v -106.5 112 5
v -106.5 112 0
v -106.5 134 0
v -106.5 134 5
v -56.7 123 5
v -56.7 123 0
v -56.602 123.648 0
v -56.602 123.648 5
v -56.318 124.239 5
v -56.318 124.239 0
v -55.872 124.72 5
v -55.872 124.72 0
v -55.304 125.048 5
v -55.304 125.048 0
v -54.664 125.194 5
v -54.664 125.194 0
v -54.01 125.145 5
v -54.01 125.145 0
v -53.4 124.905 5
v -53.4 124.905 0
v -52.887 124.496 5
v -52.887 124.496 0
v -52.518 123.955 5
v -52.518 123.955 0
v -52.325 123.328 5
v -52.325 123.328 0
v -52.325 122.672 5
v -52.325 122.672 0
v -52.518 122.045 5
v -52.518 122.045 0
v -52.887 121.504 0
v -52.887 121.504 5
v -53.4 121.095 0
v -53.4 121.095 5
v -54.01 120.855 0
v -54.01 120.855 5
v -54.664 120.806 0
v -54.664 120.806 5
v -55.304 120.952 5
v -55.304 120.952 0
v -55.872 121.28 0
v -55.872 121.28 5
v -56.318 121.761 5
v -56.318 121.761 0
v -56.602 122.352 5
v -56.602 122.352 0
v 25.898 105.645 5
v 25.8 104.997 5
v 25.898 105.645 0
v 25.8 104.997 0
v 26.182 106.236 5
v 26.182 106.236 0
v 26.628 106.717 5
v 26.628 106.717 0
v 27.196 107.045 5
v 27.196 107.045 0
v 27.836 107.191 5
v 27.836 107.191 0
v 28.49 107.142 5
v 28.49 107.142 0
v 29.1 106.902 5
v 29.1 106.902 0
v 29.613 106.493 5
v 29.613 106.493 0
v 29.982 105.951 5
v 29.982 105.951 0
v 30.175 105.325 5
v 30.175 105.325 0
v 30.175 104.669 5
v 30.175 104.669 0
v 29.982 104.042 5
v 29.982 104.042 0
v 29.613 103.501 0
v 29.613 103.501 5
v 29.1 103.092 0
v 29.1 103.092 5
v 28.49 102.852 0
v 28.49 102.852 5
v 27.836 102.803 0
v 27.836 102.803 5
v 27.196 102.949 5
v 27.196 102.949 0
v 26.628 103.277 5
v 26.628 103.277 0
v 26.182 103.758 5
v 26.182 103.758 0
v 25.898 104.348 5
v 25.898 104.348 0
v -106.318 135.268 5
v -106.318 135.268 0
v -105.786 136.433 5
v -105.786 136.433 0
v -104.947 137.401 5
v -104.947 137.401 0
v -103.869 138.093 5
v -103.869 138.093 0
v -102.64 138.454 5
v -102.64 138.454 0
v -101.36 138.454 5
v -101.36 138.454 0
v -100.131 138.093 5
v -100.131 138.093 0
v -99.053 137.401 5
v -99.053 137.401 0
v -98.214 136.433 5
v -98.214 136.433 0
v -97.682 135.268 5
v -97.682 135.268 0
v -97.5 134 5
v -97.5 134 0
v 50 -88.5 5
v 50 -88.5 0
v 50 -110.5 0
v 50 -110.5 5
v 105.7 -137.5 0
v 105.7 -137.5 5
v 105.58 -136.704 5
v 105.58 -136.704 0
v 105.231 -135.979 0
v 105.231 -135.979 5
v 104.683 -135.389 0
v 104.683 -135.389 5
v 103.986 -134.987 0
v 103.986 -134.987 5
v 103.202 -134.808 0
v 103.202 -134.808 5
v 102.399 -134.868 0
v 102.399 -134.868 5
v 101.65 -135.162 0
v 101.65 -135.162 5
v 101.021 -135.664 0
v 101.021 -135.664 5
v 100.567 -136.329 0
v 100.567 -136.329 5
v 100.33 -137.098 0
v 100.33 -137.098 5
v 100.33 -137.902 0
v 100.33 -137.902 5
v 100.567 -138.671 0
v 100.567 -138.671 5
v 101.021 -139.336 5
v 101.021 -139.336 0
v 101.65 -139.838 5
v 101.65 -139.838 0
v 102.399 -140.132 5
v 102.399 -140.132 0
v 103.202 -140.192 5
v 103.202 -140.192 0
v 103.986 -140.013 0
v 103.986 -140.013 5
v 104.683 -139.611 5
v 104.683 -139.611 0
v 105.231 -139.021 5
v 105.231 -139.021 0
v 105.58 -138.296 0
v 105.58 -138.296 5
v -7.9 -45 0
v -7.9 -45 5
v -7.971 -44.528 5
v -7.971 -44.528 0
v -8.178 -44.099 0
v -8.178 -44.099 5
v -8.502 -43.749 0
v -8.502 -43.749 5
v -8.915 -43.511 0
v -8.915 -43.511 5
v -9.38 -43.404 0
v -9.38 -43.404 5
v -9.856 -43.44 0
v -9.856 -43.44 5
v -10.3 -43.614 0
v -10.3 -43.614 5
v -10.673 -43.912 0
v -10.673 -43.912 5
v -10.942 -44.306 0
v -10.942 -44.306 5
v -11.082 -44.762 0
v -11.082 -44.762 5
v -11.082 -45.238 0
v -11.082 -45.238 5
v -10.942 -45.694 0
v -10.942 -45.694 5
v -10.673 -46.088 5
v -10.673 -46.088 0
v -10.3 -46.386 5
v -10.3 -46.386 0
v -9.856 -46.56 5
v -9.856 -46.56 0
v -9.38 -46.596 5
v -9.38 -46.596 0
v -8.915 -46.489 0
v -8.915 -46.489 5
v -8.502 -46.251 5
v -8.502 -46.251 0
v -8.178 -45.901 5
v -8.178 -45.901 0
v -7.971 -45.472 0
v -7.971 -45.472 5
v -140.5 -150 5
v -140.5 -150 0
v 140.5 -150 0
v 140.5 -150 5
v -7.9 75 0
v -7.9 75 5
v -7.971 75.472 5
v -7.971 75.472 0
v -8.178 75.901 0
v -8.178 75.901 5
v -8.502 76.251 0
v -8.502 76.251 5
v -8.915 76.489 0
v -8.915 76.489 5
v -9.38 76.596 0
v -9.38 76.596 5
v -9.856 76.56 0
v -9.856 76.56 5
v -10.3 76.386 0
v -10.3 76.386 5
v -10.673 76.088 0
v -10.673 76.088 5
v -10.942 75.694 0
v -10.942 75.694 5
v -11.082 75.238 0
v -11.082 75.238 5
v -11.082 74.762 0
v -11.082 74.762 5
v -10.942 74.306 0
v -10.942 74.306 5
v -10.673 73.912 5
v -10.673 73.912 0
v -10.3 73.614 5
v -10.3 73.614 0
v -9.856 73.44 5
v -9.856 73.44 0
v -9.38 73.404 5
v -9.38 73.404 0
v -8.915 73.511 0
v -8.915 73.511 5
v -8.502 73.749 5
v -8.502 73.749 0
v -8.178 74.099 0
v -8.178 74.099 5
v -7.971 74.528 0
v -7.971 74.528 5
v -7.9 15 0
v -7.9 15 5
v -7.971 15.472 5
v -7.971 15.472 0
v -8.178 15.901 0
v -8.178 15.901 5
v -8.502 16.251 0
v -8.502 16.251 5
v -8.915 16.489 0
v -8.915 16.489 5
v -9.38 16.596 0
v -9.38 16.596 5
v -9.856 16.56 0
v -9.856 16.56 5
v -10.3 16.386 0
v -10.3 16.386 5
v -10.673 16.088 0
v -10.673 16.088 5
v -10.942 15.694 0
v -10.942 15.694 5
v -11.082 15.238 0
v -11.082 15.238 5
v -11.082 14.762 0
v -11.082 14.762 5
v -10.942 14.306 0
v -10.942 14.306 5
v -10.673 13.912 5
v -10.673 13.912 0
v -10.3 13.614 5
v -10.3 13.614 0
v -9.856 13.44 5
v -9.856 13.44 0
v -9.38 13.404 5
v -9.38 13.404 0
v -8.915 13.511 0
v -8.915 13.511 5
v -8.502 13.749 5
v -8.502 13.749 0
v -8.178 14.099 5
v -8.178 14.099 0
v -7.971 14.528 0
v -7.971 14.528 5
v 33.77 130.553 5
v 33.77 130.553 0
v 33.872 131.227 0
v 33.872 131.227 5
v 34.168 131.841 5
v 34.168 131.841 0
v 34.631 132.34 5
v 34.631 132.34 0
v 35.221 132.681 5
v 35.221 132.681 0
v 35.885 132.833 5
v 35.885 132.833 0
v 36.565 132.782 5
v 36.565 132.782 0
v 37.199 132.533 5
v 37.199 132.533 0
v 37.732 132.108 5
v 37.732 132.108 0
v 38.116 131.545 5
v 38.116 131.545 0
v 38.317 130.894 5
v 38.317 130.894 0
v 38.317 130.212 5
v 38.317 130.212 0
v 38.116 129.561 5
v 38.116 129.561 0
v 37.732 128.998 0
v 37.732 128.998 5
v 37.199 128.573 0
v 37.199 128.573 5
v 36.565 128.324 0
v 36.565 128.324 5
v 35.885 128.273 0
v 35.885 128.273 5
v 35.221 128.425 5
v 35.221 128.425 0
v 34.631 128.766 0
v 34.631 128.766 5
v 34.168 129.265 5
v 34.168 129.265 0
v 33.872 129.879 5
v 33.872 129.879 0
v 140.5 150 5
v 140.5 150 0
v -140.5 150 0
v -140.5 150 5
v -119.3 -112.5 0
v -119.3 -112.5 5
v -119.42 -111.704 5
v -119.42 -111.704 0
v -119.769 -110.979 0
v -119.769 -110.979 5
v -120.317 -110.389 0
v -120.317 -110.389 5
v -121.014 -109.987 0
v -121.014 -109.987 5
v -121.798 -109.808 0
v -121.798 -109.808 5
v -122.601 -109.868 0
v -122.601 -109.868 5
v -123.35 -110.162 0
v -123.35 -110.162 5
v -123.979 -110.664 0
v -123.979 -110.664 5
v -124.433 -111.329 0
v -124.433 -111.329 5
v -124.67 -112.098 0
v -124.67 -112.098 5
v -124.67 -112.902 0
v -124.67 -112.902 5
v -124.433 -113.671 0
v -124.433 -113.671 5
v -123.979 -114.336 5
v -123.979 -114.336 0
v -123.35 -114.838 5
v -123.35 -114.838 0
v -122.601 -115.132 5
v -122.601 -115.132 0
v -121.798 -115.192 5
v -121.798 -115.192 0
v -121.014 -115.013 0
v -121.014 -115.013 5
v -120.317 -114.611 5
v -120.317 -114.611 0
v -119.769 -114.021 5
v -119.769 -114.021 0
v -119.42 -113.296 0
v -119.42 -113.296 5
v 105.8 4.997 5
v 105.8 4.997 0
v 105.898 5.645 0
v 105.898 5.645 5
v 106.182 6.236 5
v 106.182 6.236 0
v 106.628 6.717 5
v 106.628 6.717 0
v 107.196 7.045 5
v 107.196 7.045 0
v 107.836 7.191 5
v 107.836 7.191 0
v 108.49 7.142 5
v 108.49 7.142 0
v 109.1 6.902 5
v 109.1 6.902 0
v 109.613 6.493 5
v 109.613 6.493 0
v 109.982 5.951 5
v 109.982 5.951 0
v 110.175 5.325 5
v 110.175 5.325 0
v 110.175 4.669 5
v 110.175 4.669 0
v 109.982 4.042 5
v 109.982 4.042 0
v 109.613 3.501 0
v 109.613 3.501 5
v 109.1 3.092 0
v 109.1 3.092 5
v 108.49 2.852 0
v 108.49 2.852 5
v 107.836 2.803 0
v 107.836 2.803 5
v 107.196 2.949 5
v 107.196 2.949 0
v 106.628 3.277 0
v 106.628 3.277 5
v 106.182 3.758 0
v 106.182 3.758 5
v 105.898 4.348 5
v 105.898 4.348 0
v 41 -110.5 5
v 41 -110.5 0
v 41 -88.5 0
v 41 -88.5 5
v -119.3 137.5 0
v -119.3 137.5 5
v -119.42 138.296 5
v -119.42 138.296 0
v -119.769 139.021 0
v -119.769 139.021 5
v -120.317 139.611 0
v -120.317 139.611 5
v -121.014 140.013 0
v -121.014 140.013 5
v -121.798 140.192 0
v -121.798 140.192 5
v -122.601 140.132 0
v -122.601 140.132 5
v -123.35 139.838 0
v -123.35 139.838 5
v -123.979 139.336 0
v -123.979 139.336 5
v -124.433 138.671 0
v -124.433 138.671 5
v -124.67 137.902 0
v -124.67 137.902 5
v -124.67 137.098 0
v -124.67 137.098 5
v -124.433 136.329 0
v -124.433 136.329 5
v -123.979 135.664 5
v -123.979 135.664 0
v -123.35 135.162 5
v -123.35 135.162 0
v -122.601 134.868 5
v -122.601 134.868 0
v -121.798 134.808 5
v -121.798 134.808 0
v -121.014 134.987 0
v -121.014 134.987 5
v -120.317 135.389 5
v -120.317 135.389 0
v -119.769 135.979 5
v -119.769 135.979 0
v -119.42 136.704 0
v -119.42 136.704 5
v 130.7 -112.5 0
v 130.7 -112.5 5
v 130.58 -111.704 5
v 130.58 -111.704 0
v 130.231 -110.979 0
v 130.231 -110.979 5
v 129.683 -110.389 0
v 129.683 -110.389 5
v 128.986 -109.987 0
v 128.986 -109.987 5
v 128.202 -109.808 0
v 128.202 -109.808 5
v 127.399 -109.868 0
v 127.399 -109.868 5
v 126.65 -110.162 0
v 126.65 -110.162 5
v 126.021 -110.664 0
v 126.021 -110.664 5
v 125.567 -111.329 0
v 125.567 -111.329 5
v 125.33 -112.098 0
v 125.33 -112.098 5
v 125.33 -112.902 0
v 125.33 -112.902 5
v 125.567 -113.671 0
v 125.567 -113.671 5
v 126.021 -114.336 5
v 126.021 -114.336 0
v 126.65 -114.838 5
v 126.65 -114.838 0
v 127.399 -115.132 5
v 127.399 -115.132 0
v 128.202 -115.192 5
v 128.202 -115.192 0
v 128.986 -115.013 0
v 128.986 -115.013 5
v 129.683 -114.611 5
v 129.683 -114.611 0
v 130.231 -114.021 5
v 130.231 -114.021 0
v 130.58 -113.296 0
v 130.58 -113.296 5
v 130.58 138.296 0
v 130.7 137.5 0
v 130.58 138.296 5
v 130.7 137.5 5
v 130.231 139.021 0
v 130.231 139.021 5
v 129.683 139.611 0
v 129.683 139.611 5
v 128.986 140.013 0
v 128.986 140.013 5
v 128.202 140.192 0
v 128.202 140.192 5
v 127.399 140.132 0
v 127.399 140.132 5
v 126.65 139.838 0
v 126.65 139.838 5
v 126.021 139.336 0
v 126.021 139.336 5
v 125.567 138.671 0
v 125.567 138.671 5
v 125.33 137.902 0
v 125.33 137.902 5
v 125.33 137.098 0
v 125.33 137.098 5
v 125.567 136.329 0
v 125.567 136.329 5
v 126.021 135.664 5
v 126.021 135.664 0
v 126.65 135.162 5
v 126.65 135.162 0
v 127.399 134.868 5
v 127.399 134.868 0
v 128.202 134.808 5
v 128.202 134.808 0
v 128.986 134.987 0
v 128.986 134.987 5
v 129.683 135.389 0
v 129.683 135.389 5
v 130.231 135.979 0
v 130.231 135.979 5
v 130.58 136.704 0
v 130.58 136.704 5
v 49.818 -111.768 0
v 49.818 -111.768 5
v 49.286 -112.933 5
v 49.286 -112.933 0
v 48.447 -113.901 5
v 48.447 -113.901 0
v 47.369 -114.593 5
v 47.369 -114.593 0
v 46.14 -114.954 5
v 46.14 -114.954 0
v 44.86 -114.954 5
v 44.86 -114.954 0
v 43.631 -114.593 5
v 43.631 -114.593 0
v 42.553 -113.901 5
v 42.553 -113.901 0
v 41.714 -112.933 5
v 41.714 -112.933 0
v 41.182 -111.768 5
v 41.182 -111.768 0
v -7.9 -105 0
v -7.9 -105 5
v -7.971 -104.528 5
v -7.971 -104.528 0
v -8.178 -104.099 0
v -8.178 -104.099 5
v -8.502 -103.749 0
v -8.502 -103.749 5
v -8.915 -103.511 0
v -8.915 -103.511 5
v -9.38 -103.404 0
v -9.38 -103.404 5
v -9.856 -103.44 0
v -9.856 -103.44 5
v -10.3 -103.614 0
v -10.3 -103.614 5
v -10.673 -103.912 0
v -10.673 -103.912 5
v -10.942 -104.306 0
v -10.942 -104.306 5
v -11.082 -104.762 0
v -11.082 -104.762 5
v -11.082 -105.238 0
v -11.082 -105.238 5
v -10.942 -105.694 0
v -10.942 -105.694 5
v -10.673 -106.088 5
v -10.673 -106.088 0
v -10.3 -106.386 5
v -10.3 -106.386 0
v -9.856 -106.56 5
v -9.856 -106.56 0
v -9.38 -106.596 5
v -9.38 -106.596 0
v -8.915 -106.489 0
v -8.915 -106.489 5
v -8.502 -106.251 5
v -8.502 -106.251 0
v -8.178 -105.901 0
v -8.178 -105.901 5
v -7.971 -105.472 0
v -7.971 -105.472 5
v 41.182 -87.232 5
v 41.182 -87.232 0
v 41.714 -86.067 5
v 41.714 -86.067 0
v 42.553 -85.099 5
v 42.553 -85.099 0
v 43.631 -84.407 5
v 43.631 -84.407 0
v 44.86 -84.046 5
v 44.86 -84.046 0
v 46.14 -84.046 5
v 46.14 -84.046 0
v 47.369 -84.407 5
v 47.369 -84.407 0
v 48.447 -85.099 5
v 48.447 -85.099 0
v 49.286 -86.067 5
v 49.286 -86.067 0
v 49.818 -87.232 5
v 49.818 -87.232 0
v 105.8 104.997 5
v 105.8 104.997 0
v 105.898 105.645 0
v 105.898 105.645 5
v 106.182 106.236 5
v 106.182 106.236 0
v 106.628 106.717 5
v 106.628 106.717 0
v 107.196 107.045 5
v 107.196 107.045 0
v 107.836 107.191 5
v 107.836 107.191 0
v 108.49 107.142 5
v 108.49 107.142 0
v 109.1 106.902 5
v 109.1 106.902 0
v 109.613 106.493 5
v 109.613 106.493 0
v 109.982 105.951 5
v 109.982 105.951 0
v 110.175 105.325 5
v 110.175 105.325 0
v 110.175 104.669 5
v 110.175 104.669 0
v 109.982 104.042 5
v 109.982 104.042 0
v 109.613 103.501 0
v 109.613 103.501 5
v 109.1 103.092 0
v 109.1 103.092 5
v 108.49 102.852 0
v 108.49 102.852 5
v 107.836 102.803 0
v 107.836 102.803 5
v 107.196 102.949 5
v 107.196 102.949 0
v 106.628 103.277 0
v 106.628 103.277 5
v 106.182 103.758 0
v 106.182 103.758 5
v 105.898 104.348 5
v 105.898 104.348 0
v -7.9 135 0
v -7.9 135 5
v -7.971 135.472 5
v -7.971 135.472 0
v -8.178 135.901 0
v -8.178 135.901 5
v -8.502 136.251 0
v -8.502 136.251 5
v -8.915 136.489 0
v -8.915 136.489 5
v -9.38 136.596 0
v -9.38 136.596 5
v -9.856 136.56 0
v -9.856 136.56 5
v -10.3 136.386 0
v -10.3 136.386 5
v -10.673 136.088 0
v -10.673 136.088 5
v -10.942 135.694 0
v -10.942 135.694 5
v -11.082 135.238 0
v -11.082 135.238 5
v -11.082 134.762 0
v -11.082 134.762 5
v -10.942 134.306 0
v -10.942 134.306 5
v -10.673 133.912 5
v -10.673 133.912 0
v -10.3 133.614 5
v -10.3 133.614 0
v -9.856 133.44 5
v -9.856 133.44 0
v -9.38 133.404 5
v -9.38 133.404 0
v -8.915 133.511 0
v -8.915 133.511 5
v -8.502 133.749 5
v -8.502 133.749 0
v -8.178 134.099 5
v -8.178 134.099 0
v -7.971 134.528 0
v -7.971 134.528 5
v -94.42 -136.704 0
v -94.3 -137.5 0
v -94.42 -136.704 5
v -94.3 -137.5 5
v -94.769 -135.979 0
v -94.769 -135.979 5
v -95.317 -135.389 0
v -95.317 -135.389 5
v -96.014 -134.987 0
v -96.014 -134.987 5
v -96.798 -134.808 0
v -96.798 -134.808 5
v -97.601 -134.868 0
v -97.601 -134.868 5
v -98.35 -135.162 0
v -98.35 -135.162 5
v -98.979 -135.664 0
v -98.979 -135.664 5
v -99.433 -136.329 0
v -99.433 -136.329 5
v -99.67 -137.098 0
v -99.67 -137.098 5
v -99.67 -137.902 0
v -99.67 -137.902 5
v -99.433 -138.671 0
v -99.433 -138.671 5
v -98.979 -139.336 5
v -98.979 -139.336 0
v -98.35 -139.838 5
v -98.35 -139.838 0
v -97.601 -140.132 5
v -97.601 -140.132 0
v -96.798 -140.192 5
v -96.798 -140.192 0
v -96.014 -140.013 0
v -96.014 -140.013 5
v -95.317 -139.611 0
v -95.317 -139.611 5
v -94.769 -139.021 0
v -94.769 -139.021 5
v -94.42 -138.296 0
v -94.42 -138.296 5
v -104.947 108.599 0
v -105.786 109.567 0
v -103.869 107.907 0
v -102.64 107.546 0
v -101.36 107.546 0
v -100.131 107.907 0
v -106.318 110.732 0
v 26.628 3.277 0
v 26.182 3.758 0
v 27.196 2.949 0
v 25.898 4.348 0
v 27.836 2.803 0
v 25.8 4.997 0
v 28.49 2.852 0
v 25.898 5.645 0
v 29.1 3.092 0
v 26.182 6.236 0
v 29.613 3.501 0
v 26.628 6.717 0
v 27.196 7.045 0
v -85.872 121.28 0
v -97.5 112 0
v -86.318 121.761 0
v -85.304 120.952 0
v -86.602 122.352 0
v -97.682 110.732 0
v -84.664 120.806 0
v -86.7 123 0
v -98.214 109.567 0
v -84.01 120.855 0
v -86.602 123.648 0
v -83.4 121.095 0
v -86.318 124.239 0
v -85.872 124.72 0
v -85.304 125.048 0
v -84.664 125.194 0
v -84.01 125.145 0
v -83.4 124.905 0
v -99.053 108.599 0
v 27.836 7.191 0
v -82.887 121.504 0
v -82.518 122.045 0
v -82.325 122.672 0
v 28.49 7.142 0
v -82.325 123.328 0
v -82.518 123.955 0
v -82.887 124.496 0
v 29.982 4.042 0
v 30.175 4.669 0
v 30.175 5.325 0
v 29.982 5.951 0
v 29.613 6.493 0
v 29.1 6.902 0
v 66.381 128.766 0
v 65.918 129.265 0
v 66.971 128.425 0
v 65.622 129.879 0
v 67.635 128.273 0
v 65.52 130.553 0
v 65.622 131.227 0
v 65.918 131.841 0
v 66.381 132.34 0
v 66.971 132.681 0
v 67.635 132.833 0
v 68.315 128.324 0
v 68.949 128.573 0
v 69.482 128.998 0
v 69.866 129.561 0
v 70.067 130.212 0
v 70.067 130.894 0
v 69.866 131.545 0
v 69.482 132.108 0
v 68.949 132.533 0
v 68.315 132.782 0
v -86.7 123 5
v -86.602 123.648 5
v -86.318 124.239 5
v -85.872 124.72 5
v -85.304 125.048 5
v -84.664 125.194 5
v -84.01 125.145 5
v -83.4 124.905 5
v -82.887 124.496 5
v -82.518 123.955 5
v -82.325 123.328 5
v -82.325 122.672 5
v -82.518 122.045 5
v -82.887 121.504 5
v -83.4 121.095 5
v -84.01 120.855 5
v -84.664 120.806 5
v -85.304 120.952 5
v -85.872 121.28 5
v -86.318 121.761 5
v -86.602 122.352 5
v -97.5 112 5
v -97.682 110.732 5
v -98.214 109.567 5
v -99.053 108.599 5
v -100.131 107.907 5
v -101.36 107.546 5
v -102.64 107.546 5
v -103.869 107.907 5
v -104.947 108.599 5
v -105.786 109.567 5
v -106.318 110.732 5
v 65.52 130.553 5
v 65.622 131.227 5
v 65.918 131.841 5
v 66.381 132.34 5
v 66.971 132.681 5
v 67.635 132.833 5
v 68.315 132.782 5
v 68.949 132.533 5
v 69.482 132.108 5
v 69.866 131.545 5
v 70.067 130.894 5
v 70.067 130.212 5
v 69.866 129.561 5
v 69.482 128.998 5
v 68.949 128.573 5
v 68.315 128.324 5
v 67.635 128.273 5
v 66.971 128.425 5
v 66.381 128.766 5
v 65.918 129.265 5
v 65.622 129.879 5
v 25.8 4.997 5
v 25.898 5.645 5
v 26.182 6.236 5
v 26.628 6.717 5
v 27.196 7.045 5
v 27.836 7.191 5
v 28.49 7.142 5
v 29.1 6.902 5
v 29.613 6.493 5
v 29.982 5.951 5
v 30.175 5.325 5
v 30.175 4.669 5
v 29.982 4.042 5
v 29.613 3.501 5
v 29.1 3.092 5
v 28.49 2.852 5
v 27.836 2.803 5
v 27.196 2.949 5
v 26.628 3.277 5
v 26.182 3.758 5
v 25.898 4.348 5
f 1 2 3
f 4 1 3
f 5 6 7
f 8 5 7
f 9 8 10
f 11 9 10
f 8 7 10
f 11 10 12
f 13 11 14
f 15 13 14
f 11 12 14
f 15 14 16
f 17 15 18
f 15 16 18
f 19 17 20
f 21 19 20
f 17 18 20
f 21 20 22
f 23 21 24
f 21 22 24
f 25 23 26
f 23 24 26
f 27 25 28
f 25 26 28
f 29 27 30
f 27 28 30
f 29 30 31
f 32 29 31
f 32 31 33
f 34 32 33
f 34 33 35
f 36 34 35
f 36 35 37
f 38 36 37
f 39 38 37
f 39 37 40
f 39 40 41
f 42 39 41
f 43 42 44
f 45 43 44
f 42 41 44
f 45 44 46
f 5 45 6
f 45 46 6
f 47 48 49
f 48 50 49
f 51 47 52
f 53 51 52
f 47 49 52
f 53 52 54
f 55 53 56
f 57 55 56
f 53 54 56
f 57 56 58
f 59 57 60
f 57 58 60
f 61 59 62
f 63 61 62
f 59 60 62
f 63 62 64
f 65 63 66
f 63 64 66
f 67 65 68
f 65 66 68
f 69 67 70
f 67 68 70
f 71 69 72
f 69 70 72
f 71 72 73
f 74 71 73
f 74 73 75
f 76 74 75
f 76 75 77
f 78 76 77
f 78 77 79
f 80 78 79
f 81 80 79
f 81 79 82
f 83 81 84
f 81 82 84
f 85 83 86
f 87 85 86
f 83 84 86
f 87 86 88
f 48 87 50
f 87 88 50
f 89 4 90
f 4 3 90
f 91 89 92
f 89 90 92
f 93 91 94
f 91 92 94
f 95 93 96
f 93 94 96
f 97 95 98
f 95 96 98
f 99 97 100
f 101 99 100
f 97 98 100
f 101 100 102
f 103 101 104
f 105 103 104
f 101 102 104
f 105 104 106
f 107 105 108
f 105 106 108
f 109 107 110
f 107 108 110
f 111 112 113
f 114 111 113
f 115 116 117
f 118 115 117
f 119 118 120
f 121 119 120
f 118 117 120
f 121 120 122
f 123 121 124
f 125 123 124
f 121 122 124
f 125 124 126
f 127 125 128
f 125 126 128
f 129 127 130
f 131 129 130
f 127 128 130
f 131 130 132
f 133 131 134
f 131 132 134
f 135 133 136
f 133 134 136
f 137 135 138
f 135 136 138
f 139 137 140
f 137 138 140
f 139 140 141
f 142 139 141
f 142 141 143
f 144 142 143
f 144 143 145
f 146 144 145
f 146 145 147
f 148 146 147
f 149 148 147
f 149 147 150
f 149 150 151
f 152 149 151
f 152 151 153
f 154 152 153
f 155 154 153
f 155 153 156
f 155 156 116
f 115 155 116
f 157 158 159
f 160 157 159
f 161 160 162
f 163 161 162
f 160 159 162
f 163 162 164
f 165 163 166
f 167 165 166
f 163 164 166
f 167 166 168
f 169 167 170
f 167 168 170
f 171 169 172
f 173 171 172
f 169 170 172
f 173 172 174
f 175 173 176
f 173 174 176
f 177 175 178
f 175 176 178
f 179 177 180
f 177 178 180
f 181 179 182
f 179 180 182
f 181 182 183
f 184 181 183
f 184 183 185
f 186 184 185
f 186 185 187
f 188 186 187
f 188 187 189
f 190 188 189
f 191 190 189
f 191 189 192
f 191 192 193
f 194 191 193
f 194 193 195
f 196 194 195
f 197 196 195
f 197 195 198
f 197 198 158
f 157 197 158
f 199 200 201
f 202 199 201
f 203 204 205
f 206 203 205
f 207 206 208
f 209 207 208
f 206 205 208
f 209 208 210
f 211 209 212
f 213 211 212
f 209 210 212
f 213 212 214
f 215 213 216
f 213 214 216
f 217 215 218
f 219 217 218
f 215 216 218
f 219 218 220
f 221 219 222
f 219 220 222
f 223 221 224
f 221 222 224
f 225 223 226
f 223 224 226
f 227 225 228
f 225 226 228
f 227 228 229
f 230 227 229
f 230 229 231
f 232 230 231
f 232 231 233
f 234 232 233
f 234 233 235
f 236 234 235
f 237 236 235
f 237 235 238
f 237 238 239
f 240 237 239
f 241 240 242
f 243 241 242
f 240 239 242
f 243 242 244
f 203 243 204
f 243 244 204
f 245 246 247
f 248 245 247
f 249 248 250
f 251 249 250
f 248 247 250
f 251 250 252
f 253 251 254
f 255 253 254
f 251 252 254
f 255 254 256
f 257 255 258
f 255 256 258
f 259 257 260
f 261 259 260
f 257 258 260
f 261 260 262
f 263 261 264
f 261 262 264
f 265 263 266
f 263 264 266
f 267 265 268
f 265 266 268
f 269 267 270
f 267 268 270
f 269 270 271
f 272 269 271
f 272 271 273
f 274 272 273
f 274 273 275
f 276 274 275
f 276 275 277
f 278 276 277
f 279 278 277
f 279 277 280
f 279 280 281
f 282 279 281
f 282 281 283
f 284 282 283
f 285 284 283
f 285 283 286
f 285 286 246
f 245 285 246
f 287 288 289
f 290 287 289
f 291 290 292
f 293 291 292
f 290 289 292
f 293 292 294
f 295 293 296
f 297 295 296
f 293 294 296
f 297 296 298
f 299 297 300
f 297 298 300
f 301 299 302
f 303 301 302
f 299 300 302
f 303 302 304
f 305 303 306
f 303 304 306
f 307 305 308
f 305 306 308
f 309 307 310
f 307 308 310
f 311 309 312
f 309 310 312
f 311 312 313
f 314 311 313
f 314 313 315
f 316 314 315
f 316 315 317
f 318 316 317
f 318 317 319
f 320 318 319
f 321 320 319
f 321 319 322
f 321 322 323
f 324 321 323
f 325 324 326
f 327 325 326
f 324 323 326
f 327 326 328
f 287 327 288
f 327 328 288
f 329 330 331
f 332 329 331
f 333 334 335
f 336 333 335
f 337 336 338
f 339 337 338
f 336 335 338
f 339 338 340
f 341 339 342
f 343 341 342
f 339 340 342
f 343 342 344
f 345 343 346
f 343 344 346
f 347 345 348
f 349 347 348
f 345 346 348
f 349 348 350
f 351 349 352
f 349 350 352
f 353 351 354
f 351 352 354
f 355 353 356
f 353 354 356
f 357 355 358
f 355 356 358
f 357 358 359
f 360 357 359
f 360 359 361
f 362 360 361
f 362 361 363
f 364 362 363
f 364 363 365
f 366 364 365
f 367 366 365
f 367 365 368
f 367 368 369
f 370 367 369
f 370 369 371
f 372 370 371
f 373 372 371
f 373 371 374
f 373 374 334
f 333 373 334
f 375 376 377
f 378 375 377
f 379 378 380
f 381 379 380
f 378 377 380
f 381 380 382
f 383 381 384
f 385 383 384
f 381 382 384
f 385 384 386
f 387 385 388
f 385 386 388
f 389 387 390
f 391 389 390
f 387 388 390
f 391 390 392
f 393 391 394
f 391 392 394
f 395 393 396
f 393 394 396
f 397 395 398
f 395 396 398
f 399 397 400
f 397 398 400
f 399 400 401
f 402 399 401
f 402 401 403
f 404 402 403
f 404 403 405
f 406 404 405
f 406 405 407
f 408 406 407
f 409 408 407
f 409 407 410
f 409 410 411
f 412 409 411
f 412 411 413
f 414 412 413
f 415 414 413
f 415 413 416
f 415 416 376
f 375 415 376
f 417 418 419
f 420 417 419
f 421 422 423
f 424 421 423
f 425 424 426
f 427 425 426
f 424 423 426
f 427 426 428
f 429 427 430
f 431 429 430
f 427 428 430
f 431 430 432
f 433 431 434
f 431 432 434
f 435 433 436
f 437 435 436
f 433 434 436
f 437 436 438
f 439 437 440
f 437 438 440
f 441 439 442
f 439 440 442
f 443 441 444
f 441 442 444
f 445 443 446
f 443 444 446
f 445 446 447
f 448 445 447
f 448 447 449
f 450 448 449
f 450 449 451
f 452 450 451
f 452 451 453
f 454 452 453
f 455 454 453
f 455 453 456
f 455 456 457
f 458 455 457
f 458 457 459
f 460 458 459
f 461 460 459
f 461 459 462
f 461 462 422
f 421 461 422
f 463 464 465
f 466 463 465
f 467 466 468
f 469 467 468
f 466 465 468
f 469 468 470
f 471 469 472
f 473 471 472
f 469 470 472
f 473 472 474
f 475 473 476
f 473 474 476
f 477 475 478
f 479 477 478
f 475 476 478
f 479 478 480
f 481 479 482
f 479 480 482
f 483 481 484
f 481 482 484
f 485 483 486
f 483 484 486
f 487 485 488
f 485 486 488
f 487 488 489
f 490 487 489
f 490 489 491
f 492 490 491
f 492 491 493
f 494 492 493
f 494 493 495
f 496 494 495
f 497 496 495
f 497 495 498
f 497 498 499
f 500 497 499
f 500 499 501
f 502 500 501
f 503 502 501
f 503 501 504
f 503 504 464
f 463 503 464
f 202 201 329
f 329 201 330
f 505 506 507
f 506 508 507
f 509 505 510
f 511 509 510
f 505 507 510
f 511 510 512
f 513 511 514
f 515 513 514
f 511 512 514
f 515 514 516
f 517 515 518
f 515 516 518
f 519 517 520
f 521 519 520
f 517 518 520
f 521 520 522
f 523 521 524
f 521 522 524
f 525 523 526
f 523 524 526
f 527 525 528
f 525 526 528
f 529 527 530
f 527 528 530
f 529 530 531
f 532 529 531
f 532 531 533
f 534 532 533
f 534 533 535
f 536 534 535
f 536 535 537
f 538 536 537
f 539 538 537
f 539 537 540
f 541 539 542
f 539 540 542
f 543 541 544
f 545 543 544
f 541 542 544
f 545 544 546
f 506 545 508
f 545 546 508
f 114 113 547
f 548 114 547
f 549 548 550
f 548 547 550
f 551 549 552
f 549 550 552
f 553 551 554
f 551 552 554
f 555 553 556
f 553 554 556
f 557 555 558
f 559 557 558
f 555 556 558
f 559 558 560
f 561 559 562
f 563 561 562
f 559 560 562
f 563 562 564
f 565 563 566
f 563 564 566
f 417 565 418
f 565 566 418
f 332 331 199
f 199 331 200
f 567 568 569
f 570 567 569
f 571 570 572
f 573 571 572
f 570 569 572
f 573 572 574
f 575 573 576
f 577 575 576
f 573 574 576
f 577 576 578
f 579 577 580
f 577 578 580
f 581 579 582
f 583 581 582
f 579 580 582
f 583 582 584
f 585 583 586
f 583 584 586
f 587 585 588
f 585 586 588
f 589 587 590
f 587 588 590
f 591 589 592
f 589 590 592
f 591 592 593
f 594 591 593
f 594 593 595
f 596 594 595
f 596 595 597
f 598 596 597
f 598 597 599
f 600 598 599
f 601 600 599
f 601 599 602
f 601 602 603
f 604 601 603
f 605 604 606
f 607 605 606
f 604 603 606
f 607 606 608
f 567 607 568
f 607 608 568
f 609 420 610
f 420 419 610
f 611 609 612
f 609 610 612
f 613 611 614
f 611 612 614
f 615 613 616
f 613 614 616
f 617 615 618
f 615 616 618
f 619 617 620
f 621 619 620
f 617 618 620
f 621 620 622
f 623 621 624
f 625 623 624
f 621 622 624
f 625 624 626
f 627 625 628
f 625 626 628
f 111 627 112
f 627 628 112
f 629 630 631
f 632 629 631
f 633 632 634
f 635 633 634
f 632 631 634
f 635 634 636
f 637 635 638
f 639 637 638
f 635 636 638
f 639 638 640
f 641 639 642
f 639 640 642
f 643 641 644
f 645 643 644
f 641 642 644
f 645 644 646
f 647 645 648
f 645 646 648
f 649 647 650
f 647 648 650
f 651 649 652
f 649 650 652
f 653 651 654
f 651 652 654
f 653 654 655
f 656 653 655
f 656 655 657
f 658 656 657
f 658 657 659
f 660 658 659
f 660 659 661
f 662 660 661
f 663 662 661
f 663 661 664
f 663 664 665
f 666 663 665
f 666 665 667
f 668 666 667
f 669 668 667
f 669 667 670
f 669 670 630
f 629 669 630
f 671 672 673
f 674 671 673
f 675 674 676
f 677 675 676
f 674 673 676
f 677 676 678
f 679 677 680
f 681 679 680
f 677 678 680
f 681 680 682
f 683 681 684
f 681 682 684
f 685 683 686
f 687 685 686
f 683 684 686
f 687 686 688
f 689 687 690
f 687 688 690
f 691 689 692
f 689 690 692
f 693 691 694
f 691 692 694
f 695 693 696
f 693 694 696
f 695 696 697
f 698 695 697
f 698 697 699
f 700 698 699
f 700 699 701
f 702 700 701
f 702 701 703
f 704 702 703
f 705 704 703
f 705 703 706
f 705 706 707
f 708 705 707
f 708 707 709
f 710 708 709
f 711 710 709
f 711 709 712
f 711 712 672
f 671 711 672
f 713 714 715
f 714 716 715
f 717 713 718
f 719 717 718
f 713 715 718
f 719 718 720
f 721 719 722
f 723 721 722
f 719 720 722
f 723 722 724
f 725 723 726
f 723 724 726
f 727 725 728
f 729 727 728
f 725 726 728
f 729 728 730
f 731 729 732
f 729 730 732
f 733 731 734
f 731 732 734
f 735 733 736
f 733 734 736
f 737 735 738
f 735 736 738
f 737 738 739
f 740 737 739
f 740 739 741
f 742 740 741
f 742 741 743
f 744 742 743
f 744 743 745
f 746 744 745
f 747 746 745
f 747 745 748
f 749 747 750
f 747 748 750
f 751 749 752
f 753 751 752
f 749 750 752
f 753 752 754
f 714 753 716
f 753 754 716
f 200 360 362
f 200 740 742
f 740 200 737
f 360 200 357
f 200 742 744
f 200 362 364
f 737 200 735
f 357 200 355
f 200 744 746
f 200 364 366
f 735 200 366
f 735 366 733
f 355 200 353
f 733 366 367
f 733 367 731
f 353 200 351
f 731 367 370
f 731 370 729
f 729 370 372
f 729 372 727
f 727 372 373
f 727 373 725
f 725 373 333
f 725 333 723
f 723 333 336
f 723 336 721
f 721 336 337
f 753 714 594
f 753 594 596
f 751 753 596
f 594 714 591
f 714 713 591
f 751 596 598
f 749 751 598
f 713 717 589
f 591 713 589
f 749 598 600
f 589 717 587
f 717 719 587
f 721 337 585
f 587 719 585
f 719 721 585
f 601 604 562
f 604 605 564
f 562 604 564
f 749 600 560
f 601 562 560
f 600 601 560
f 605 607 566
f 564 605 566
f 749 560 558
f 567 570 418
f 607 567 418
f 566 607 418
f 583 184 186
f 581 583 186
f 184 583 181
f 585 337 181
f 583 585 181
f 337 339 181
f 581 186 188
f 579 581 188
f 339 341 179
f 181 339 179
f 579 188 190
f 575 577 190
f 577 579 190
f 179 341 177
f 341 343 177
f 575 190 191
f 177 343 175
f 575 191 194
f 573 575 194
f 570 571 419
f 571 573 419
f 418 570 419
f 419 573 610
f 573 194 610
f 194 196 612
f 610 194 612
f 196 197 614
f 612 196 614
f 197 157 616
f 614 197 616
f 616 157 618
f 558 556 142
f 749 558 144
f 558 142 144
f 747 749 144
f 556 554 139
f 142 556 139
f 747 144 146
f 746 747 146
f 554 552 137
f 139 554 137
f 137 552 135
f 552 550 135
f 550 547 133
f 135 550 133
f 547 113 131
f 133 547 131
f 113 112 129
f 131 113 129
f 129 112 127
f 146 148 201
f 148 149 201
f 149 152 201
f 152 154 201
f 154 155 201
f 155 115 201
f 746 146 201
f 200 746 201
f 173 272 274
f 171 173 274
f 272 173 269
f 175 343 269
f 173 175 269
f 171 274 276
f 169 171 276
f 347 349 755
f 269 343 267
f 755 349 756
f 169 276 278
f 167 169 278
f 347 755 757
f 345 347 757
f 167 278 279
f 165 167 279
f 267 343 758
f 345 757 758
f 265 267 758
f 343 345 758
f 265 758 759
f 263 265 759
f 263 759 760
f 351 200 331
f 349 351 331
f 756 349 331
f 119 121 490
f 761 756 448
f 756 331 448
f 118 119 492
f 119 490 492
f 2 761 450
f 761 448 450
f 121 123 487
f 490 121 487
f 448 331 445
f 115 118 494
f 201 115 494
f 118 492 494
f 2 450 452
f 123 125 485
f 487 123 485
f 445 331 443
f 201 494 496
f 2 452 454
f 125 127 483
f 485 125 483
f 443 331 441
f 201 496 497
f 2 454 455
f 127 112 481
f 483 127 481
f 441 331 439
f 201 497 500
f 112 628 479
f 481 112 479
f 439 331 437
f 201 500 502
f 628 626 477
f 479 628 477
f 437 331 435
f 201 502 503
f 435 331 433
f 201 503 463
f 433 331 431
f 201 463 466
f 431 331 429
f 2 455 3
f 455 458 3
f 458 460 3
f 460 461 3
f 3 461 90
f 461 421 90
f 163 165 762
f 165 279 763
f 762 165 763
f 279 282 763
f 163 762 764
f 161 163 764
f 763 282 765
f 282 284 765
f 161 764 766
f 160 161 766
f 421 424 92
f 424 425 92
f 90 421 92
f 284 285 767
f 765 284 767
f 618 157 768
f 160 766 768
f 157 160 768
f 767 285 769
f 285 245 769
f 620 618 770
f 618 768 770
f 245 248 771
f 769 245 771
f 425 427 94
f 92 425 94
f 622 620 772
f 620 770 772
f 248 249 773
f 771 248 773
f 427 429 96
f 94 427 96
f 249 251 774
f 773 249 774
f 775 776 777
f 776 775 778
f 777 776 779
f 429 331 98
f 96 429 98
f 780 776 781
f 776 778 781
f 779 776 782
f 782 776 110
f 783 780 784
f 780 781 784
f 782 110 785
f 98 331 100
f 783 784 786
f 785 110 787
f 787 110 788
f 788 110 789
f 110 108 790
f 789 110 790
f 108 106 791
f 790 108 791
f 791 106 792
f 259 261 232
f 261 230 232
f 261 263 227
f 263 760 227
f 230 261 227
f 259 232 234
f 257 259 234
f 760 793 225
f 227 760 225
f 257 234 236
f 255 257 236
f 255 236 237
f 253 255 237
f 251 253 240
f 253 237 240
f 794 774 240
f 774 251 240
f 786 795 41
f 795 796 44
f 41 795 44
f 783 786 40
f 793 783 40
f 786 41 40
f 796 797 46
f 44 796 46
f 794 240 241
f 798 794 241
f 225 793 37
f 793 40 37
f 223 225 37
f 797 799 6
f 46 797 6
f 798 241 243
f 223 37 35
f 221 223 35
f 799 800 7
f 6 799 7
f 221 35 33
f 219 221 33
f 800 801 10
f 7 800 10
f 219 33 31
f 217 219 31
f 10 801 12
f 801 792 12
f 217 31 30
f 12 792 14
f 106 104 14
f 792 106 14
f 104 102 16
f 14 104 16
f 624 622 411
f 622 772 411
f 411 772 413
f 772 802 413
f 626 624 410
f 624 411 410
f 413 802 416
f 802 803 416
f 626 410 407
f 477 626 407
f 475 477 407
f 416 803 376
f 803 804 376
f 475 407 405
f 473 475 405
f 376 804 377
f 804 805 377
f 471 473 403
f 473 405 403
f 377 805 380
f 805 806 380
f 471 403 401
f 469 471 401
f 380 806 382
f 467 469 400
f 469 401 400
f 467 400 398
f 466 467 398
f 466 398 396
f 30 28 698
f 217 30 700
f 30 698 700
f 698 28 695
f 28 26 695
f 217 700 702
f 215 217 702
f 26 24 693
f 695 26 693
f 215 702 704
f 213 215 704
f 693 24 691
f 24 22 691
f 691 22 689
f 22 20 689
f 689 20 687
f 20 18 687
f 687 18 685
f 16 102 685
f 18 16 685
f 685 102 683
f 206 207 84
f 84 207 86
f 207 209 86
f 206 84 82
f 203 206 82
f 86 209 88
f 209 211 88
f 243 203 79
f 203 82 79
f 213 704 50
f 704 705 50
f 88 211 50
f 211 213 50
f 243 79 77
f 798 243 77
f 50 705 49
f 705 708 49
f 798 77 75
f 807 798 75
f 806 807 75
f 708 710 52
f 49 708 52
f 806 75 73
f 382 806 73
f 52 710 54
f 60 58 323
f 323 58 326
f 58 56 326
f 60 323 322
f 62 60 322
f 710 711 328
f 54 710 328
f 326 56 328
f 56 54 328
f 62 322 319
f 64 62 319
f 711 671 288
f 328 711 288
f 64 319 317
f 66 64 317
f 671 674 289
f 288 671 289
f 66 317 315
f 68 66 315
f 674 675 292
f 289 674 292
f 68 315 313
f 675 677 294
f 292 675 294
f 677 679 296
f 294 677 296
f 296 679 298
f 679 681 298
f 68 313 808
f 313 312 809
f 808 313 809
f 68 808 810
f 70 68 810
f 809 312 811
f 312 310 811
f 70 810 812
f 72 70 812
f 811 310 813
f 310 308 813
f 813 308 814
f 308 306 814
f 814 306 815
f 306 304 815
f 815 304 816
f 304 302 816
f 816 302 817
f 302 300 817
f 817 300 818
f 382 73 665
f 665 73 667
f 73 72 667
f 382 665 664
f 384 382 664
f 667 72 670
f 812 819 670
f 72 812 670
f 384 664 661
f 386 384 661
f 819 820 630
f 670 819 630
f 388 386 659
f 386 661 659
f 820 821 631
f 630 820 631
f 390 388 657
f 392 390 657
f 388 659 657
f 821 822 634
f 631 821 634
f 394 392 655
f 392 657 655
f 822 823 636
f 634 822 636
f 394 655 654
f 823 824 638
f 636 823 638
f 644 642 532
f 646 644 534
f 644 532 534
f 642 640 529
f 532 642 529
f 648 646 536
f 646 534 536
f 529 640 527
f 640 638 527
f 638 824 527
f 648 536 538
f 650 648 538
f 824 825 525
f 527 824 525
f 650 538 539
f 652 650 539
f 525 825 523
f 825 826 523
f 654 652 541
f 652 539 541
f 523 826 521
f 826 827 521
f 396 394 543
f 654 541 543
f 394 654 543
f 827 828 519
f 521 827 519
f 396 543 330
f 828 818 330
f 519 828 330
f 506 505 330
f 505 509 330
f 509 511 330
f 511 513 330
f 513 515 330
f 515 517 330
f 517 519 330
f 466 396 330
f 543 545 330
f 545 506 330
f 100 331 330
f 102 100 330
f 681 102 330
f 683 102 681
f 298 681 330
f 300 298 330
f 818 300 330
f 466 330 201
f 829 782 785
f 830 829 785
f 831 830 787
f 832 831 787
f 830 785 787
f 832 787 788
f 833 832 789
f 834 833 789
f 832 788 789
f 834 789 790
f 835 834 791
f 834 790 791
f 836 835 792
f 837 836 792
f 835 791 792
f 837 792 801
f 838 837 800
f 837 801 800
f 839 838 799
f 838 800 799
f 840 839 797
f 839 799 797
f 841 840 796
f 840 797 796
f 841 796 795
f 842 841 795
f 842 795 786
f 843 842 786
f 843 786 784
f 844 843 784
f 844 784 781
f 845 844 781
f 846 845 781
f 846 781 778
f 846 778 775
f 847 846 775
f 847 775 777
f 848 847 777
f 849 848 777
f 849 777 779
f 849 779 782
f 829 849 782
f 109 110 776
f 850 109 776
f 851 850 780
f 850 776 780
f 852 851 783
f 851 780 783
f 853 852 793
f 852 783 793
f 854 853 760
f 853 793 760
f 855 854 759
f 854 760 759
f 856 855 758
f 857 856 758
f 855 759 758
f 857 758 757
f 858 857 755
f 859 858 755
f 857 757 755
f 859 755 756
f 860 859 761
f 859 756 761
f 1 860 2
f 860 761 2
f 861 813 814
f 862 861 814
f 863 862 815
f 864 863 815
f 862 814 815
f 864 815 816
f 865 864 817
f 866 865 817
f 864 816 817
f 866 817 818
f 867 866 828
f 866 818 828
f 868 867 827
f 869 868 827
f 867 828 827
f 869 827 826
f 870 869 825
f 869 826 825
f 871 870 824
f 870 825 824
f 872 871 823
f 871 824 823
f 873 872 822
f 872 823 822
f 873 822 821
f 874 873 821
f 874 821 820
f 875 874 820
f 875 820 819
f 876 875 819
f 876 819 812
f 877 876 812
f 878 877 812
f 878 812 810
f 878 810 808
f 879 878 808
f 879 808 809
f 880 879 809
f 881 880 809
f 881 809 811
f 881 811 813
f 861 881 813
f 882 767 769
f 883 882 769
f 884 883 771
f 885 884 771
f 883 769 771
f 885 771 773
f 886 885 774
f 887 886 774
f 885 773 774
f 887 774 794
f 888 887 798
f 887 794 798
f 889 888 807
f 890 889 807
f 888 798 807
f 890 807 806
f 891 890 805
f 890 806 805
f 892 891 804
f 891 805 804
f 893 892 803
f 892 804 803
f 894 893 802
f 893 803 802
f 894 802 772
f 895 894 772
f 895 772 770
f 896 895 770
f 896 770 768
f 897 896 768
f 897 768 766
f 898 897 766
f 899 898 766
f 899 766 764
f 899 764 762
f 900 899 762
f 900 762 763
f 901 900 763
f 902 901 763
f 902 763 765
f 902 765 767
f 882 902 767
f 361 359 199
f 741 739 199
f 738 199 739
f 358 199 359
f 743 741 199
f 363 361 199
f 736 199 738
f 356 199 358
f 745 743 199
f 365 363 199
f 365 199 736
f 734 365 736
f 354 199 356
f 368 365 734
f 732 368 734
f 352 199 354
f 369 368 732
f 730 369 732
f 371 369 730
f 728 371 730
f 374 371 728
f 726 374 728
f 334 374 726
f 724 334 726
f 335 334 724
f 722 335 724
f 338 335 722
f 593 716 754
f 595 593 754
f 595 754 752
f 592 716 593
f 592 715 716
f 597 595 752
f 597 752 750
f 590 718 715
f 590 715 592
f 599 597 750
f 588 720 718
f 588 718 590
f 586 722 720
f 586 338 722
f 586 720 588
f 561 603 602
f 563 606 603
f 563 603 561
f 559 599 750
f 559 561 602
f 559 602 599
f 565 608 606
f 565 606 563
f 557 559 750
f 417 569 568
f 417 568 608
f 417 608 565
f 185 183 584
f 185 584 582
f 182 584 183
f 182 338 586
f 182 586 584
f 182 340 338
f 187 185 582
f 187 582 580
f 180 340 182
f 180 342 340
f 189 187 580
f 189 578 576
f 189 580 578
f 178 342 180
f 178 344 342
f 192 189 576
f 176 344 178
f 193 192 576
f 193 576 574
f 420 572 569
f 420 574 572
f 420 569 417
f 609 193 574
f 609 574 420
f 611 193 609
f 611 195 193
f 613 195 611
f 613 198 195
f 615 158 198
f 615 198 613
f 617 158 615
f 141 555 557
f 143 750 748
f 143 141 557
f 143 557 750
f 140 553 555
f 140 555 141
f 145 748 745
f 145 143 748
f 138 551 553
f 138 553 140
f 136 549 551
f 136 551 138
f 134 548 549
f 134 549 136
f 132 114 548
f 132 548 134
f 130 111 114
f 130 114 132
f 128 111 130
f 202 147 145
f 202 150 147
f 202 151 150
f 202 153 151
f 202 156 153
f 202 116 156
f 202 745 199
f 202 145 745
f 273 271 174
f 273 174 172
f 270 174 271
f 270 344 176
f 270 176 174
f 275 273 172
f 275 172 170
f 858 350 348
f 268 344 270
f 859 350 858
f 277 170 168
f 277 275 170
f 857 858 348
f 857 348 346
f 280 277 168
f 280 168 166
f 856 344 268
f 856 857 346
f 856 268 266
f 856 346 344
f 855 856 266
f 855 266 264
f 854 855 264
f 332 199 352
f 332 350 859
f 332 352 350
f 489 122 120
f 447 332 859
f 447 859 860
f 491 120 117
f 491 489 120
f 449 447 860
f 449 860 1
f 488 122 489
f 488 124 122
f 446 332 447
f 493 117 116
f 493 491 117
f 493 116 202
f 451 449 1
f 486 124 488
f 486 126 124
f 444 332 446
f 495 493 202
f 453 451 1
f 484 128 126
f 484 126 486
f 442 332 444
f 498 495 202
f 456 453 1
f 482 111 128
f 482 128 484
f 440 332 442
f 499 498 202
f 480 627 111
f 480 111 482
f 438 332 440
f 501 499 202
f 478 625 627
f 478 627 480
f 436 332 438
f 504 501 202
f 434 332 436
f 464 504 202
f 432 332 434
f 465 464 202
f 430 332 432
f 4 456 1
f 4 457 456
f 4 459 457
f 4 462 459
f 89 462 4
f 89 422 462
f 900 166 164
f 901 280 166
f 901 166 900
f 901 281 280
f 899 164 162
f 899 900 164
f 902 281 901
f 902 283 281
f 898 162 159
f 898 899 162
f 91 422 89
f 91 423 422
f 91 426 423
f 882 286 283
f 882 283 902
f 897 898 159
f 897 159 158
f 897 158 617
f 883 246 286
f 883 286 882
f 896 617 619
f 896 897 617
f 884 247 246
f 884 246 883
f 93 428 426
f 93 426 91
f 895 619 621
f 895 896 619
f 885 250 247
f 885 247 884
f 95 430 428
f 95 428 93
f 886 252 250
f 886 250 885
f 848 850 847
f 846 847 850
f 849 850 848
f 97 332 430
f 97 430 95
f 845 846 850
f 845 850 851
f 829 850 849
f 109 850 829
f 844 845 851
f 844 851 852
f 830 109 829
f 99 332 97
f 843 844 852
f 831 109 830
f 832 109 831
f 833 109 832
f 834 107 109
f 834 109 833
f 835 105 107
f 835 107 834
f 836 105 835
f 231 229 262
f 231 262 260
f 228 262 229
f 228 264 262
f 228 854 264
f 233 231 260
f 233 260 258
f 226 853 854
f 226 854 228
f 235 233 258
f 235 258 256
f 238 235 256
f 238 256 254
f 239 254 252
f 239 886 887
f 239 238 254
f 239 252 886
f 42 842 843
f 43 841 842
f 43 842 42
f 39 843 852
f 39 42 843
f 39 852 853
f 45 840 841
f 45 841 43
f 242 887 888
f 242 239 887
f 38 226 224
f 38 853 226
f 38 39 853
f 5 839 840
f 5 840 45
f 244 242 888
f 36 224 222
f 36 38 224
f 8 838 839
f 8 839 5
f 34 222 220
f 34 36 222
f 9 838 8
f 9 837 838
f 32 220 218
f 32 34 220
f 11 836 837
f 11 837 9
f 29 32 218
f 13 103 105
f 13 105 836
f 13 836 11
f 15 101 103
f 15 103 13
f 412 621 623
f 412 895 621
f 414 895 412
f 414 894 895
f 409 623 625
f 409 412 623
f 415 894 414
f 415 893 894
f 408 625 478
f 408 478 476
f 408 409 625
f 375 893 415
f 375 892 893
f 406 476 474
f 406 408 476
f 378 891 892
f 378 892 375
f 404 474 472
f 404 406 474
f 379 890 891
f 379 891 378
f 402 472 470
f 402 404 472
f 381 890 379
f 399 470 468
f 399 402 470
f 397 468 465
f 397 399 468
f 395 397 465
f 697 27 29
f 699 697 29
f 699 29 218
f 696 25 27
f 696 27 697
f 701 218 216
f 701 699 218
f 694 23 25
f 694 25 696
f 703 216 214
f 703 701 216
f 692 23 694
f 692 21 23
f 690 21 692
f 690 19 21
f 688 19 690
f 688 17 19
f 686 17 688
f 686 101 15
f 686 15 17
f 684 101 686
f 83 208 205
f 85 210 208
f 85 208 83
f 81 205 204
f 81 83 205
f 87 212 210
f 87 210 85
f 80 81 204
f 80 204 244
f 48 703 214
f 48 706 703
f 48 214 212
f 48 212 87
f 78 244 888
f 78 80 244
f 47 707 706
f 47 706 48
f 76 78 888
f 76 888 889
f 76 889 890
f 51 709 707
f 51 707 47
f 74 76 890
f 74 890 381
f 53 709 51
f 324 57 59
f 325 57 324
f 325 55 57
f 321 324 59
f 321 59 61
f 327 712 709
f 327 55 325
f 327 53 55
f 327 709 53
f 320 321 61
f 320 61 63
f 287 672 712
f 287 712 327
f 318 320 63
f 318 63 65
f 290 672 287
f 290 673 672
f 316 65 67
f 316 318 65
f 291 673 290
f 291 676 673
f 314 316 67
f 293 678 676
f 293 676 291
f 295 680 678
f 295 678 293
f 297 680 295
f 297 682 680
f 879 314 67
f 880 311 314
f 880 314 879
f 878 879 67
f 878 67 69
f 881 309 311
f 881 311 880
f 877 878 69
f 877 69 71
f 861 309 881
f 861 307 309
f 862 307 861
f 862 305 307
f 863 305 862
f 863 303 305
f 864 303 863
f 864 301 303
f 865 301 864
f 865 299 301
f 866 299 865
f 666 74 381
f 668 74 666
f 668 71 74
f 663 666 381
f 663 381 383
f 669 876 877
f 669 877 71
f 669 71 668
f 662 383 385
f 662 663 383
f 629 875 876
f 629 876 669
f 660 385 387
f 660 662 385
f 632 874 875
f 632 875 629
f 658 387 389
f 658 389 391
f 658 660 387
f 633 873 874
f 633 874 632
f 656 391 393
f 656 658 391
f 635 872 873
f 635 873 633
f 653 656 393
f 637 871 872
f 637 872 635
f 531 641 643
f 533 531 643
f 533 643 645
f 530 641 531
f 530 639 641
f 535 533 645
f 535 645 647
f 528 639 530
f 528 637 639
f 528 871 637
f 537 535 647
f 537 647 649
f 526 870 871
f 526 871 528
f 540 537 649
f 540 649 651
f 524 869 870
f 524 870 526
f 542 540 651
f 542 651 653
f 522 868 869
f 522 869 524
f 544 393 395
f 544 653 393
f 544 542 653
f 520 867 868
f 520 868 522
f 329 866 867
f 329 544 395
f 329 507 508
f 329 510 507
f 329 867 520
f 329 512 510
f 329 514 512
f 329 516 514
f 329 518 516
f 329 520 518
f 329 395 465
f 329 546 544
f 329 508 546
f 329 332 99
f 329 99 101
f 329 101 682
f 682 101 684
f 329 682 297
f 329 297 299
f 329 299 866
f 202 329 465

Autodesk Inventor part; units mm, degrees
ref_plane "YZ Plane" through (0, 0, 0) normal (1, 0, 0) x (0, 1, 0)
ref_plane "XZ Plane" through (0, 0, 0) normal (0, 1, 0) x (-1, 0, 0)
ref_plane "XY Plane" through (0, 0, 0) normal (0, 0, 1) x (1, 0, 0)
sketch "Sketch1" plane through (0, 0, 0) normal (0, 0, 1) x (1, 0, 0)
  line L0 (-140.5, -150) -> (140.5, -150)
  line L1 (140.5, -150) -> (140.5, 150)
  line L2 (140.5, 150) -> (-140.5, 150)
  line L3 (-140.5, 150) -> (-140.5, -150)
  line L4 (-140.5, -150) -> (140.5, 150) construction
  line L5 (140.5, -150) -> (-140.5, 150) construction
  point P0 (0, 0)
  dimension "d0" = 300
  dimension "d1" = 281
extrude "Extrusion1" add sketch "Sketch1" along normal blind 5
sketch "Sketch5" plane through (0, 0, 5) normal (0, 0, 1) x (1, 0, 0)
  line L0 (-140.5, -150) -> (140.5, -150) projected
  line L1 (140.5, -150) -> (140.5, 150) projected
  line L2 (140.5, 150) -> (-140.5, 150) projected
  line L3 (-140.5, 150) -> (-140.5, -150) projected
  line L4 (-122, -112.5) -> (128, -112.5) construction
  line L5 (128, -112.5) -> (128, 137.5) construction
  line L6 (128, 137.5) -> (-122, 137.5) construction
  line L7 (-122, 137.5) -> (-122, -112.5) construction
  line L8 (-122, -112.5) -> (128, 137.5) construction
  line L9 (128, -112.5) -> (-122, 137.5) construction
  circle A0 centre (-122, 137.5) radius 2.7
  circle A1 centre (128, 137.5) radius 2.7
  circle A2 centre (128, -112.5) radius 2.7
  circle A3 centre (-122, -112.5) radius 2.7
  circle A4 centre (-97, -137.5) radius 2.7
  circle A5 centre (103, -137.5) radius 2.7
  point P0 (0, 0)
  point P1 (3, 12.5)
  dimension "d34" = 18.5
  dimension "d35" = 37.5
  dimension "d36" = 12.5
  dimension "d37" = 5.4
  dimension "d38" = 12.5
  dimension "d39" = 37.5
  dimension "d40" = 43.5
  dimension "d83" = 12.5
extrude "Extrusion5" cut sketch "Sketch5" against normal through all contours A0 | A1 | A2 | A3 | A4 | A5
sketch "Sketch6" plane through (0, 0, 5) normal (0, 0, 1) x (1, 0, 0)
  line L0 (-140.5, -150) -> (140.5, -150) projected
  line L1 (140.5, -150) -> (140.5, 150) projected
  line L2 (-140.5, 150) -> (-140.5, -150) projected
  line L3 (-17, -110) -> (-2, -110) construction
  line L4 (-2, -110) -> (-2, 140) construction
  line L5 (-2, 140) -> (-17, 140) construction
  line L6 (-17, 140) -> (-17, -110) construction
  line L7 (-17, -110) -> (-2, 140) construction
  line L8 (-2, -110) -> (-17, 140) construction
  circle A0 centre (-9.5, 15) radius 1.6
  circle A1 centre (-9.5, 75) radius 1.6
  circle A2 centre (-9.5, 135) radius 1.6
  circle A3 centre (-9.5, -45) radius 1.6
  circle A4 centre (-9.5, -105) radius 1.6
  line L9 (-9.5, -105) -> (-9.5, -45) construction
  line L10 (-9.5, -45) -> (-9.5, 15) construction
  line L11 (-9.5, 15) -> (-9.5, 75) construction
  line L12 (-9.5, 75) -> (-9.5, 135) construction
  line L13 (115.5, -150) -> (-134.5, -150) construction
  line L14 (-134.5, -150) -> (-134.5, 62.3779) construction
  line L15 (-134.5, 62.3779) -> (115.5, 62.3779) construction
  line L16 (115.5, 62.3779) -> (115.5, -150) construction
  line L17 (-9.5, 62.3779) -> (-9.5, 15) construction
  point P0 (0, 0)
  dimension "d43" = 250
  dimension "d44" = 15
  dimension "d45" = 60
  dimension "d46" = 3.2
  dimension "d47" = 6
  dimension "d48" = 25
  dimension "d49" = 40
extrude "Extrusion6" cut sketch "Sketch6" against normal through all
sketch "Sketch7" plane through (0, 0, 0) normal (0, 0, -1) x (-1, 0, 0)
  circle A0 centre (9.5, 135) radius 1.6 projected
  circle A1 centre (122, 137.5) radius 2.7 projected
  circle A2 centre (-128, 137.5) radius 2.7 projected
  line L0 (140.5, -150) -> (-140.5, -150) projected
  line L1 (140.5, 150) -> (140.5, -150) projected
  line L2 (-140.5, 150) -> (140.5, 150) projected
  line L3 (-140.5, -150) -> (-140.5, 150) projected
  line L4 (-53, -125) -> (-103, -125) construction
  line L5 (-103, -125) -> (-103, -74) construction
  line L6 (-103, -74) -> (-53, -74) construction
  line L7 (-53, -74) -> (-53, -125) construction
  line L8 (94.5, 150) -> (44.5, 150) construction
  line L9 (44.5, 150) -> (44.5, 96) construction
  line L10 (44.5, 96) -> (94.5, 96) construction
  line L11 (94.5, 96) -> (94.5, 150) construction
  circle A3 centre (54.5, 123) radius 2.2
  circle A4 centre (84.5, 123) radius 2.2
  line L12 (-45.5, -88.5) -> (-45.5, -110.5) construction
  line L13 (-50, -88.5) -> (-50, -110.5)
  line L14 (-41, -110.5) -> (-41, -88.5)
  arc A5 (-41, -88.5) -> (-50, -88.5) centre (-45.5, -88.5) ccw
  arc A6 (-50, -110.5) -> (-41, -110.5) centre (-45.5, -110.5) ccw
  line L15 (-45.5, -99.5) -> (-103, -99.5) construction
  line L16 (69.5, 96) -> (69.5, 144) construction
  line L17 (102, 134) -> (102, 112) construction
  line L18 (97.5, 134) -> (97.5, 112)
  line L19 (106.5, 112) -> (106.5, 134)
  arc A7 (106.5, 134) -> (97.5, 134) centre (102, 134) ccw
  arc A8 (97.5, 112) -> (106.5, 112) centre (102, 112) ccw
  line L20 (-73.3625, 150) -> (-30.5, 150) construction
  line L21 (-30.5, 150) -> (-30.5, 124.9969) construction
  line L22 (-30.5, 124.9969) -> (-73.3625, 124.9969) construction
  line L23 (-73.3625, 124.9969) -> (-73.3625, 150) construction
  circle A9 centre (-67.8063, 130.5531) radius 2.286
  circle A10 centre (-36.0563, 130.5531) radius 2.286
  line L24 (-108, 4.9969) -> (-28, 4.9969) construction
  line L25 (-28, 4.9969) -> (-28, 104.9969) construction
  line L26 (-28, 104.9969) -> (-108, 104.9969) construction
  line L27 (-108, 104.9969) -> (-108, 4.9969) construction
  line L28 (-108, 4.9969) -> (-28, 104.9969) construction
  line L29 (-28, 4.9969) -> (-108, 104.9969) construction
  circle A11 centre (-108, 104.9969) radius 2.2
  circle A12 centre (-28, 104.9969) radius 2.2
  circle A13 centre (-28, 4.9969) radius 2.2
  circle A14 centre (-108, 4.9969) radius 2.2
  point P0 (0, 0)
  point P1 (102, 123)
  point P2 (-68, 54.9969)
  dimension "d52" = 50
  dimension "d53" = 51
  dimension "d54" = 25
  dimension "d55" = 54
  dimension "d56" = 50
  dimension "d57" = 30
  dimension "d58" = 4.4
  dimension "d59" = 10
  dimension "d60" = 27
  dimension "d61" = 37.5
  dimension "d62" = 22
  dimension "d63" = 9
  dimension "d64" = 3
  dimension "d65" = 60
  dimension "d66" = 3
  dimension "d67" = 15.5
  dimension "d68" = 31.75
  dimension "d69" = 42.8625
  dimension "d70" = 5.5563
  dimension "d71" = 25.0031
  dimension "d72" = 5.5563
  dimension "d73" = 4.572
  dimension "d74" = 35
  dimension "d75" = 40
  dimension "d76" = 100
  dimension "d77" = 80
  dimension "d78" = 4.4
  dimension "d79" = 20
  dimension "d80" = 20
  dimension "d84" = 72.6937
  dimension "d85" = 19.4469
extrude "Extrusion7" cut sketch "Sketch7" against normal through all contours A3 | A4 | A5 L14 A6 L13 | A7 L19 A8 L18 | A9 | A10 | A11 | A12 | A13 | A14
equation "\"d59\" = -0.5 * d57 + 0.5 * d56"
equation "\"d60\" = 0.5 * d55"
equation "\"d72\" = -0.5 * d68 + 0.5 * d69"
properties part number "NewBackPlate"
